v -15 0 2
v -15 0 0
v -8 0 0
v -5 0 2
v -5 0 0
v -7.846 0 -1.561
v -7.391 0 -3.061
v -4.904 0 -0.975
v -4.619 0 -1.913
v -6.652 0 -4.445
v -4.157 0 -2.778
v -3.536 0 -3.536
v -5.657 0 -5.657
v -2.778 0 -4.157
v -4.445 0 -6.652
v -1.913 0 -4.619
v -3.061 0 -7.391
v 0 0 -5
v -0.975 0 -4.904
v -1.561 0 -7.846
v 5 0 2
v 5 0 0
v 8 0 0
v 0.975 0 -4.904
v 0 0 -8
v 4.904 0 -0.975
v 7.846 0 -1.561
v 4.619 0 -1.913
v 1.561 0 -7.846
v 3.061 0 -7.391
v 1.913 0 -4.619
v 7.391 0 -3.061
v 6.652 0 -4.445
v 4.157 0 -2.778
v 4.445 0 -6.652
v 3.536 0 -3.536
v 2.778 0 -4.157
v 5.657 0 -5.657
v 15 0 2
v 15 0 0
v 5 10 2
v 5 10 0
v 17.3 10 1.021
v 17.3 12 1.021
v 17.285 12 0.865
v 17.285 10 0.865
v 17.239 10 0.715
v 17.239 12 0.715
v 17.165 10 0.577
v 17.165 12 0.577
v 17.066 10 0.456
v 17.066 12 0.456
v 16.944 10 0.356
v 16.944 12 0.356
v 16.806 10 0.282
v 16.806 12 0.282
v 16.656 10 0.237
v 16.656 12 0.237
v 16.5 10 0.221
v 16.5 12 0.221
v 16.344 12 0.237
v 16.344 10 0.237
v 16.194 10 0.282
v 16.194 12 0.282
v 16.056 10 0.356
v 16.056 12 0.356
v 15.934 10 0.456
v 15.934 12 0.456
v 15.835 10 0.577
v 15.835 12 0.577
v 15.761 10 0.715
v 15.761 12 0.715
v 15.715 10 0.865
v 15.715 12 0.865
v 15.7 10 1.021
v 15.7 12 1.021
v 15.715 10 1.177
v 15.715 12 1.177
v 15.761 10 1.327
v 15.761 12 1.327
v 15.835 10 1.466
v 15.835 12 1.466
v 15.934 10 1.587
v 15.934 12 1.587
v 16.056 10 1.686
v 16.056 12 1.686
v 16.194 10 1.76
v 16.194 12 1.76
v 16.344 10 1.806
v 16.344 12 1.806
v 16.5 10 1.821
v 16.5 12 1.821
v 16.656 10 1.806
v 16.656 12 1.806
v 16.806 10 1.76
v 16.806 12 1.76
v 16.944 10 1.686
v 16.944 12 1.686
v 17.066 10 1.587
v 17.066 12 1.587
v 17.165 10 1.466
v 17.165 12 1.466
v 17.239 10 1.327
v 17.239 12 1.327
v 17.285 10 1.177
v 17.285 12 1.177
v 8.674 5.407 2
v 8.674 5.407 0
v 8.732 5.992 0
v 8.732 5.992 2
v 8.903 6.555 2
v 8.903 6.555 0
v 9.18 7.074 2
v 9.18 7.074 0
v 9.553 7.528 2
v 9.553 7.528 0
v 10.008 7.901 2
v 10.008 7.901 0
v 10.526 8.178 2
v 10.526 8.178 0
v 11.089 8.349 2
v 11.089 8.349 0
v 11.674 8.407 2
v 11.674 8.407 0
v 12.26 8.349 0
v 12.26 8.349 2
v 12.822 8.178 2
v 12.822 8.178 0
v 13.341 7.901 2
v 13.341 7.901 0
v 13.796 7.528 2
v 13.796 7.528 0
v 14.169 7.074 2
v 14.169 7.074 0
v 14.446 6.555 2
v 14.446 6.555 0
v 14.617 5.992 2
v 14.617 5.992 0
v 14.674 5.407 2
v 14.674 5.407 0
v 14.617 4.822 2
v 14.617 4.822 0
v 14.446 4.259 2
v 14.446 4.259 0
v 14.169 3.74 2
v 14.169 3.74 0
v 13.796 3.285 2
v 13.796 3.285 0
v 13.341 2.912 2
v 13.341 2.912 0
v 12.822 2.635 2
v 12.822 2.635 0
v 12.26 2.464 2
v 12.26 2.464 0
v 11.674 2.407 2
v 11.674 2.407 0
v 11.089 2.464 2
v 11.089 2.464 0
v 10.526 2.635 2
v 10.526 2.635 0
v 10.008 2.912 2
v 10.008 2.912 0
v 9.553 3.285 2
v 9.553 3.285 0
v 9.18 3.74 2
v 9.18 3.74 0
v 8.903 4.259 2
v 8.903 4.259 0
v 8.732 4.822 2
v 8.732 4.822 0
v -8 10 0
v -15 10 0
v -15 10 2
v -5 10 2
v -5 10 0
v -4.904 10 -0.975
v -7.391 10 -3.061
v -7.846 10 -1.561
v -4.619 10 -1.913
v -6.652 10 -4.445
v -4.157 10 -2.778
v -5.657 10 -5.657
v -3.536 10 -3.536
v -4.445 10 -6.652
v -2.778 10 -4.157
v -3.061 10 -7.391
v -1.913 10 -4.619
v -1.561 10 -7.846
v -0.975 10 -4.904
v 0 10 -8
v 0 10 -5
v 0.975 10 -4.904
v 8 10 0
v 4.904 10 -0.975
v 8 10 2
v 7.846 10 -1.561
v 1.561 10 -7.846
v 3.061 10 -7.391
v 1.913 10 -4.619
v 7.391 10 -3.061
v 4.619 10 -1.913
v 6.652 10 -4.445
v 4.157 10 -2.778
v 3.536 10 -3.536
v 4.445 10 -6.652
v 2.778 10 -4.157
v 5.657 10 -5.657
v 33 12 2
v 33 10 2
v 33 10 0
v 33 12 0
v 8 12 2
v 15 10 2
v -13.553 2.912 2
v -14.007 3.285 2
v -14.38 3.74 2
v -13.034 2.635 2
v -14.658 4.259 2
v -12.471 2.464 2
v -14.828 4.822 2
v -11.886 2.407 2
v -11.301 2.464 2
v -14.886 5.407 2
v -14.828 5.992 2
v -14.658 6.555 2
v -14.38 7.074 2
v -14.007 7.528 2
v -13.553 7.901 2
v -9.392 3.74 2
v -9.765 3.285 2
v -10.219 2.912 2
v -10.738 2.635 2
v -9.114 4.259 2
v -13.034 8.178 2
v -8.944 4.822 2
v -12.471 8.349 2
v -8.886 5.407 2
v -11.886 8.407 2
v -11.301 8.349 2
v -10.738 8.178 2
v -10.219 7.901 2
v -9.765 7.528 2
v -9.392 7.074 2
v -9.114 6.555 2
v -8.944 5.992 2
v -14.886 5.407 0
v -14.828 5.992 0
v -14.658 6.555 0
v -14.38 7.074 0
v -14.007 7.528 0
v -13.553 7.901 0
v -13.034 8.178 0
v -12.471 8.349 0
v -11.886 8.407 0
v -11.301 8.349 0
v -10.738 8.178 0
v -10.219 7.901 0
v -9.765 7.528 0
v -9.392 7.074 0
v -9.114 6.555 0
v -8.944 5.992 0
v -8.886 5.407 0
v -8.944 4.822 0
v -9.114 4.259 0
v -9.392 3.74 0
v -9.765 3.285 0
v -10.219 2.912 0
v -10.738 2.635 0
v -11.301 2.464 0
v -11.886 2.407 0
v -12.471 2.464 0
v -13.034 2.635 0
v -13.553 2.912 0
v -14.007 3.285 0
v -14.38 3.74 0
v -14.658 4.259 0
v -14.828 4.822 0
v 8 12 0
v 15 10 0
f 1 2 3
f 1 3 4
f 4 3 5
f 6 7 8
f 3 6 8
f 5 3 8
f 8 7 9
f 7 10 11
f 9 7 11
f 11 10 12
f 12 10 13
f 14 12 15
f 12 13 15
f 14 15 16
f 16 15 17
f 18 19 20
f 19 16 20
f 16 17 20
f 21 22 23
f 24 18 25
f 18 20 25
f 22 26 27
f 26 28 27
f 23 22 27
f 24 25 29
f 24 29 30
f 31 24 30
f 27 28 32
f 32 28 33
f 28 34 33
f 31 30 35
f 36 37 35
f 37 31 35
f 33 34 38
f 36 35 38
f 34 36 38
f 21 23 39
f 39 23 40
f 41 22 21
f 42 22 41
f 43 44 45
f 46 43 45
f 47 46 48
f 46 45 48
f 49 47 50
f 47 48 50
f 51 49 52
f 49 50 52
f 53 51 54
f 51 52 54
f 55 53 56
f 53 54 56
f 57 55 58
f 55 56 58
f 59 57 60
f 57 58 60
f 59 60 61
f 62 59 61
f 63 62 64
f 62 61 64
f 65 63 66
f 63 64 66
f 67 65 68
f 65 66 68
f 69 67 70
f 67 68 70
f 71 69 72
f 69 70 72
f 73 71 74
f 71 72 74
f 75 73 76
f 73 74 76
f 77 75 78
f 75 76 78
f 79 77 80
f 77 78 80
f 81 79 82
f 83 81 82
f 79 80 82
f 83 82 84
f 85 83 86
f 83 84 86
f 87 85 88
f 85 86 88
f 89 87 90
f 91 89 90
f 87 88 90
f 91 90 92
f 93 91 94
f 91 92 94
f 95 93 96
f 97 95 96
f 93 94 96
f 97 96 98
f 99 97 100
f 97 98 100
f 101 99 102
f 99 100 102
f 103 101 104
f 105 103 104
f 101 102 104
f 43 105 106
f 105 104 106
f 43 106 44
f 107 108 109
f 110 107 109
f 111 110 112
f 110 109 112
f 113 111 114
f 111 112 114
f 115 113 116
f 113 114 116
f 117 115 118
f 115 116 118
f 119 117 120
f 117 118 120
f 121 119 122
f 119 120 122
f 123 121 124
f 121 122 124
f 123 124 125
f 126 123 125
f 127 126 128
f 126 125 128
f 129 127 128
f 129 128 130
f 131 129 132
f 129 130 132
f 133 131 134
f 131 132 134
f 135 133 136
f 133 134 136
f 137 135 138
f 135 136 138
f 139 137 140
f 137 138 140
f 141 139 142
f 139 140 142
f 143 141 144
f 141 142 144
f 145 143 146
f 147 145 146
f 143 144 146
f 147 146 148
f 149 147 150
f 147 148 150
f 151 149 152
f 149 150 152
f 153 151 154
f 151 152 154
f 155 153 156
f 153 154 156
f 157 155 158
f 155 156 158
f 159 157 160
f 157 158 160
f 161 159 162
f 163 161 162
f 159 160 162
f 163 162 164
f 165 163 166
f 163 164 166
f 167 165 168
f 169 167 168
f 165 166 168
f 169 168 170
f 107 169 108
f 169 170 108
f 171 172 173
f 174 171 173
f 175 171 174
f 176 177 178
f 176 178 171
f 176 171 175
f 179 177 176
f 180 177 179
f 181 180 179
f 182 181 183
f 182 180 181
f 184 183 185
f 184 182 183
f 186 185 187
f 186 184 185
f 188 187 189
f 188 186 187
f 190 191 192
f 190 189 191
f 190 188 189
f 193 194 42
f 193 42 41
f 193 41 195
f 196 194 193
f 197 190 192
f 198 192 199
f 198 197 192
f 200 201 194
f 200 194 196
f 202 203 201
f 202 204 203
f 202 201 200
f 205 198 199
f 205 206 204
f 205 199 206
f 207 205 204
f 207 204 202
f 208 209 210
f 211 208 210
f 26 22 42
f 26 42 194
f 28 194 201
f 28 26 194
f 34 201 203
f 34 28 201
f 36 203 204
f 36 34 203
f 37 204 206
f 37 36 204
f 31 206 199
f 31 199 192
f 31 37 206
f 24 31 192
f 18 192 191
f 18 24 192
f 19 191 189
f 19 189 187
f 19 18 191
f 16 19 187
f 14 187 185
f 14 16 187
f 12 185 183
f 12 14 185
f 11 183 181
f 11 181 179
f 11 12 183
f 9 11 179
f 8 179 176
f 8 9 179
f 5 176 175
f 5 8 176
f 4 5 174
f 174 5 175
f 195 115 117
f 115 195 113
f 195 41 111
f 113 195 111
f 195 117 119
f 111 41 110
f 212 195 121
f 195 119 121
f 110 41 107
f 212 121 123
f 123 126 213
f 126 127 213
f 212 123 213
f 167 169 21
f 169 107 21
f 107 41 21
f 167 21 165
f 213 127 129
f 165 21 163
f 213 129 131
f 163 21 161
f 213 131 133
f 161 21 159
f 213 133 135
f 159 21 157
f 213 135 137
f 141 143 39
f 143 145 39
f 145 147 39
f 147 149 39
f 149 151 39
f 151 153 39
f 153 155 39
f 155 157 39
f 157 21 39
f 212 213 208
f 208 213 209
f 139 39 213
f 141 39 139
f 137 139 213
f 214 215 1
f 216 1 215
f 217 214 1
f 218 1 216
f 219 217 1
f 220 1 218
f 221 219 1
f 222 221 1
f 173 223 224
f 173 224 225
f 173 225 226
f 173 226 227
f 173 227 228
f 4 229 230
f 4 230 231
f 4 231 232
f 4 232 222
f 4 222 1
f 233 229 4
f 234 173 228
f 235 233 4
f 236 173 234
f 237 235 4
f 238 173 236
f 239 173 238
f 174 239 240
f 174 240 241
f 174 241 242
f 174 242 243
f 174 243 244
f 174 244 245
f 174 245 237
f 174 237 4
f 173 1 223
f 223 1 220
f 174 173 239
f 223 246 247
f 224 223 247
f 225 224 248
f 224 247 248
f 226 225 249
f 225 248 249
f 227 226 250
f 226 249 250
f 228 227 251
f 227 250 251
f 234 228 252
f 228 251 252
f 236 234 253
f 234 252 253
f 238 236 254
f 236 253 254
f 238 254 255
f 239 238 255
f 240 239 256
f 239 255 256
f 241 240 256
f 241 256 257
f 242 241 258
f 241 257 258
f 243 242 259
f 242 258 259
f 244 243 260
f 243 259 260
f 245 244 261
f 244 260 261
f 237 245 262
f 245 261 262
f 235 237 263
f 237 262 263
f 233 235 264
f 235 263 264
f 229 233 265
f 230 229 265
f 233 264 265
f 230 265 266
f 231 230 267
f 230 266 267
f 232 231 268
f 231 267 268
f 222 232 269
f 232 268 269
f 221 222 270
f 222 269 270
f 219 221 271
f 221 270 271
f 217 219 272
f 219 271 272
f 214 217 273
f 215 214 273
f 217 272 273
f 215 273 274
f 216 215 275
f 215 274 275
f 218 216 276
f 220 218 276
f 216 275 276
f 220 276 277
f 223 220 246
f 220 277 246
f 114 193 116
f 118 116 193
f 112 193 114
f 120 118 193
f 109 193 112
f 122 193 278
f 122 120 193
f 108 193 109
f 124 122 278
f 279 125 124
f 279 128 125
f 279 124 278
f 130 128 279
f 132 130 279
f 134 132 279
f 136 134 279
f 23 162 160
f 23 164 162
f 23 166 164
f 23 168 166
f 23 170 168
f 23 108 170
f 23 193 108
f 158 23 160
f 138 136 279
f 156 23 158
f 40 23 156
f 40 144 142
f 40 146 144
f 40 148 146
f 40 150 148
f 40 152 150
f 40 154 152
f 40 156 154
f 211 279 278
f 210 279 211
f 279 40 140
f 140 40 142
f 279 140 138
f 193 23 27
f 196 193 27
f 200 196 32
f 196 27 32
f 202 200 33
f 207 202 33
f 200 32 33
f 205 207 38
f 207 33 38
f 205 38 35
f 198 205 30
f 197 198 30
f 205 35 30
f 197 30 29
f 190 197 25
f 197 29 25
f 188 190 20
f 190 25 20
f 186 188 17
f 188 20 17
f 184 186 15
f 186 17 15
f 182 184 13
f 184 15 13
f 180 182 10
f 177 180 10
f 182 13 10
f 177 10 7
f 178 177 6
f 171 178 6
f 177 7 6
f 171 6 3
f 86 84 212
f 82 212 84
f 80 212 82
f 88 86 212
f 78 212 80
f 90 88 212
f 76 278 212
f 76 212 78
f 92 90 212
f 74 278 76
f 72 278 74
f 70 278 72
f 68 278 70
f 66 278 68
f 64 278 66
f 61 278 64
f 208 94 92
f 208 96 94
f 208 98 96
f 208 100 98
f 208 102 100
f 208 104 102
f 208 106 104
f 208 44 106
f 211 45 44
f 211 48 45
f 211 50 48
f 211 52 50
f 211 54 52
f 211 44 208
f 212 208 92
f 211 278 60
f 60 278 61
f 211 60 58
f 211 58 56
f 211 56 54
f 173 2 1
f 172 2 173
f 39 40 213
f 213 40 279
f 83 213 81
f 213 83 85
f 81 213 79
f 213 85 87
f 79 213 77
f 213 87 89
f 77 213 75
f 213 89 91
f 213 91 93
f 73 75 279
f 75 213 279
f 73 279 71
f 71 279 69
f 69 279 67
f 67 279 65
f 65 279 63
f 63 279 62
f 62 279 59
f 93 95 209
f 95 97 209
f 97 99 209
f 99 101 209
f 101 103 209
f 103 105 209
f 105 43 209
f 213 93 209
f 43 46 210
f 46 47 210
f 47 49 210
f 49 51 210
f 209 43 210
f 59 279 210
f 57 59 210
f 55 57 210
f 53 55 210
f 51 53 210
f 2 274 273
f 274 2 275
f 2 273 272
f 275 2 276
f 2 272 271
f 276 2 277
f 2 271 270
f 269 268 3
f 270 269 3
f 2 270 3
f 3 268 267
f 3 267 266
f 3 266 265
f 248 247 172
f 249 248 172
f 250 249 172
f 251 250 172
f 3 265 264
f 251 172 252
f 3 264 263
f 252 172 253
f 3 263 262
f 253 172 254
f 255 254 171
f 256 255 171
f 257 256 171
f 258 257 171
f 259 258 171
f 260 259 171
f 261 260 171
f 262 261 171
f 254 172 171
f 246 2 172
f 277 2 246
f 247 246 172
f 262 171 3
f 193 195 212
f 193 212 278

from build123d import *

# Parameters (mm, degrees)
SKETCH2_R           = 8
SKETCH2_R_2         = 5
EXTRUDE_THIN1_DEPTH = 10
CUT_EXTRUDE1_DEPTH  = 10
SKETCH4_W           = 10
SKETCH4_H           = 10
BOSS_EXTRUDE1_DEPTH = 2
SKETCH5_R           = 3
CUT_EXTRUDE2_DEPTH  = 2
SKETCH6_W           = 25
SKETCH6_H           = 2
BOSS_EXTRUDE2_DEPTH = 2
SKETCH7_R           = 0.8
CUT_EXTRUDE3_DEPTH  = 2


with BuildPart() as part:
    # Sketch2 → Extrude-Thin1 (new body)
    with BuildSketch(Plane(origin=(0, 0, 0), x_dir=(1, 0, 0), z_dir=(0, 1, 0))):
        Circle(SKETCH2_R)
        Circle(SKETCH2_R_2, mode=Mode.SUBTRACT)
    extrude(amount=EXTRUDE_THIN1_DEPTH)

    # Sketch3 → Cut-Extrude1 (cut)
    with BuildSketch(Plane(origin=(0, 10, 0), x_dir=(1, 0, 0), z_dir=(0, 1, 0))):
        with BuildLine():
            Line((-8, 0), (8, 0))
            ThreePointArc((8, 0), (0, -8), (-8, 0))
        make_face()
    extrude(amount=-CUT_EXTRUDE1_DEPTH, mode=Mode.SUBTRACT)

    # Sketch4 → Boss-Extrude1 (add)
    with BuildSketch(Plane.XY):
        with Locations((10, 5)):
            Rectangle(SKETCH4_W, SKETCH4_H)
        with Locations((-10, 5)):
            Rectangle(SKETCH4_W, SKETCH4_H)
    extrude(amount=BOSS_EXTRUDE1_DEPTH)

    # Sketch5 → Cut-Extrude2 (cut)
    with BuildSketch(Plane(origin=(0, 0, 0), x_dir=(-1, 0, 0), z_dir=(0, 0, -1))):
        with Locations((-11.674262076, 5.406814048)):
            Circle(SKETCH5_R)
        with Locations((11.885931395, 5.406814048)):
            Circle(SKETCH5_R)
    extrude(amount=-CUT_EXTRUDE2_DEPTH, mode=Mode.SUBTRACT)

    # Sketch6 → Boss-Extrude2 (add)
    with BuildSketch(Plane(origin=(0, 10, 0), x_dir=(1, 0, 0), z_dir=(0, 1, 0))):
        with Locations((20.5, -1)):
            Rectangle(SKETCH6_W, SKETCH6_H)
    extrude(amount=BOSS_EXTRUDE2_DEPTH)

    # Sketch7 → Cut-Extrude3 (cut)
    with BuildSketch(Plane(origin=(0, 12, 0), x_dir=(1, 0, 0), z_dir=(0, 1, 0))):
        with Locations((16.5, -1.021213906)):
            Circle(SKETCH7_R)
    extrude(amount=-CUT_EXTRUDE3_DEPTH, mode=Mode.SUBTRACT)


solid = part.part
